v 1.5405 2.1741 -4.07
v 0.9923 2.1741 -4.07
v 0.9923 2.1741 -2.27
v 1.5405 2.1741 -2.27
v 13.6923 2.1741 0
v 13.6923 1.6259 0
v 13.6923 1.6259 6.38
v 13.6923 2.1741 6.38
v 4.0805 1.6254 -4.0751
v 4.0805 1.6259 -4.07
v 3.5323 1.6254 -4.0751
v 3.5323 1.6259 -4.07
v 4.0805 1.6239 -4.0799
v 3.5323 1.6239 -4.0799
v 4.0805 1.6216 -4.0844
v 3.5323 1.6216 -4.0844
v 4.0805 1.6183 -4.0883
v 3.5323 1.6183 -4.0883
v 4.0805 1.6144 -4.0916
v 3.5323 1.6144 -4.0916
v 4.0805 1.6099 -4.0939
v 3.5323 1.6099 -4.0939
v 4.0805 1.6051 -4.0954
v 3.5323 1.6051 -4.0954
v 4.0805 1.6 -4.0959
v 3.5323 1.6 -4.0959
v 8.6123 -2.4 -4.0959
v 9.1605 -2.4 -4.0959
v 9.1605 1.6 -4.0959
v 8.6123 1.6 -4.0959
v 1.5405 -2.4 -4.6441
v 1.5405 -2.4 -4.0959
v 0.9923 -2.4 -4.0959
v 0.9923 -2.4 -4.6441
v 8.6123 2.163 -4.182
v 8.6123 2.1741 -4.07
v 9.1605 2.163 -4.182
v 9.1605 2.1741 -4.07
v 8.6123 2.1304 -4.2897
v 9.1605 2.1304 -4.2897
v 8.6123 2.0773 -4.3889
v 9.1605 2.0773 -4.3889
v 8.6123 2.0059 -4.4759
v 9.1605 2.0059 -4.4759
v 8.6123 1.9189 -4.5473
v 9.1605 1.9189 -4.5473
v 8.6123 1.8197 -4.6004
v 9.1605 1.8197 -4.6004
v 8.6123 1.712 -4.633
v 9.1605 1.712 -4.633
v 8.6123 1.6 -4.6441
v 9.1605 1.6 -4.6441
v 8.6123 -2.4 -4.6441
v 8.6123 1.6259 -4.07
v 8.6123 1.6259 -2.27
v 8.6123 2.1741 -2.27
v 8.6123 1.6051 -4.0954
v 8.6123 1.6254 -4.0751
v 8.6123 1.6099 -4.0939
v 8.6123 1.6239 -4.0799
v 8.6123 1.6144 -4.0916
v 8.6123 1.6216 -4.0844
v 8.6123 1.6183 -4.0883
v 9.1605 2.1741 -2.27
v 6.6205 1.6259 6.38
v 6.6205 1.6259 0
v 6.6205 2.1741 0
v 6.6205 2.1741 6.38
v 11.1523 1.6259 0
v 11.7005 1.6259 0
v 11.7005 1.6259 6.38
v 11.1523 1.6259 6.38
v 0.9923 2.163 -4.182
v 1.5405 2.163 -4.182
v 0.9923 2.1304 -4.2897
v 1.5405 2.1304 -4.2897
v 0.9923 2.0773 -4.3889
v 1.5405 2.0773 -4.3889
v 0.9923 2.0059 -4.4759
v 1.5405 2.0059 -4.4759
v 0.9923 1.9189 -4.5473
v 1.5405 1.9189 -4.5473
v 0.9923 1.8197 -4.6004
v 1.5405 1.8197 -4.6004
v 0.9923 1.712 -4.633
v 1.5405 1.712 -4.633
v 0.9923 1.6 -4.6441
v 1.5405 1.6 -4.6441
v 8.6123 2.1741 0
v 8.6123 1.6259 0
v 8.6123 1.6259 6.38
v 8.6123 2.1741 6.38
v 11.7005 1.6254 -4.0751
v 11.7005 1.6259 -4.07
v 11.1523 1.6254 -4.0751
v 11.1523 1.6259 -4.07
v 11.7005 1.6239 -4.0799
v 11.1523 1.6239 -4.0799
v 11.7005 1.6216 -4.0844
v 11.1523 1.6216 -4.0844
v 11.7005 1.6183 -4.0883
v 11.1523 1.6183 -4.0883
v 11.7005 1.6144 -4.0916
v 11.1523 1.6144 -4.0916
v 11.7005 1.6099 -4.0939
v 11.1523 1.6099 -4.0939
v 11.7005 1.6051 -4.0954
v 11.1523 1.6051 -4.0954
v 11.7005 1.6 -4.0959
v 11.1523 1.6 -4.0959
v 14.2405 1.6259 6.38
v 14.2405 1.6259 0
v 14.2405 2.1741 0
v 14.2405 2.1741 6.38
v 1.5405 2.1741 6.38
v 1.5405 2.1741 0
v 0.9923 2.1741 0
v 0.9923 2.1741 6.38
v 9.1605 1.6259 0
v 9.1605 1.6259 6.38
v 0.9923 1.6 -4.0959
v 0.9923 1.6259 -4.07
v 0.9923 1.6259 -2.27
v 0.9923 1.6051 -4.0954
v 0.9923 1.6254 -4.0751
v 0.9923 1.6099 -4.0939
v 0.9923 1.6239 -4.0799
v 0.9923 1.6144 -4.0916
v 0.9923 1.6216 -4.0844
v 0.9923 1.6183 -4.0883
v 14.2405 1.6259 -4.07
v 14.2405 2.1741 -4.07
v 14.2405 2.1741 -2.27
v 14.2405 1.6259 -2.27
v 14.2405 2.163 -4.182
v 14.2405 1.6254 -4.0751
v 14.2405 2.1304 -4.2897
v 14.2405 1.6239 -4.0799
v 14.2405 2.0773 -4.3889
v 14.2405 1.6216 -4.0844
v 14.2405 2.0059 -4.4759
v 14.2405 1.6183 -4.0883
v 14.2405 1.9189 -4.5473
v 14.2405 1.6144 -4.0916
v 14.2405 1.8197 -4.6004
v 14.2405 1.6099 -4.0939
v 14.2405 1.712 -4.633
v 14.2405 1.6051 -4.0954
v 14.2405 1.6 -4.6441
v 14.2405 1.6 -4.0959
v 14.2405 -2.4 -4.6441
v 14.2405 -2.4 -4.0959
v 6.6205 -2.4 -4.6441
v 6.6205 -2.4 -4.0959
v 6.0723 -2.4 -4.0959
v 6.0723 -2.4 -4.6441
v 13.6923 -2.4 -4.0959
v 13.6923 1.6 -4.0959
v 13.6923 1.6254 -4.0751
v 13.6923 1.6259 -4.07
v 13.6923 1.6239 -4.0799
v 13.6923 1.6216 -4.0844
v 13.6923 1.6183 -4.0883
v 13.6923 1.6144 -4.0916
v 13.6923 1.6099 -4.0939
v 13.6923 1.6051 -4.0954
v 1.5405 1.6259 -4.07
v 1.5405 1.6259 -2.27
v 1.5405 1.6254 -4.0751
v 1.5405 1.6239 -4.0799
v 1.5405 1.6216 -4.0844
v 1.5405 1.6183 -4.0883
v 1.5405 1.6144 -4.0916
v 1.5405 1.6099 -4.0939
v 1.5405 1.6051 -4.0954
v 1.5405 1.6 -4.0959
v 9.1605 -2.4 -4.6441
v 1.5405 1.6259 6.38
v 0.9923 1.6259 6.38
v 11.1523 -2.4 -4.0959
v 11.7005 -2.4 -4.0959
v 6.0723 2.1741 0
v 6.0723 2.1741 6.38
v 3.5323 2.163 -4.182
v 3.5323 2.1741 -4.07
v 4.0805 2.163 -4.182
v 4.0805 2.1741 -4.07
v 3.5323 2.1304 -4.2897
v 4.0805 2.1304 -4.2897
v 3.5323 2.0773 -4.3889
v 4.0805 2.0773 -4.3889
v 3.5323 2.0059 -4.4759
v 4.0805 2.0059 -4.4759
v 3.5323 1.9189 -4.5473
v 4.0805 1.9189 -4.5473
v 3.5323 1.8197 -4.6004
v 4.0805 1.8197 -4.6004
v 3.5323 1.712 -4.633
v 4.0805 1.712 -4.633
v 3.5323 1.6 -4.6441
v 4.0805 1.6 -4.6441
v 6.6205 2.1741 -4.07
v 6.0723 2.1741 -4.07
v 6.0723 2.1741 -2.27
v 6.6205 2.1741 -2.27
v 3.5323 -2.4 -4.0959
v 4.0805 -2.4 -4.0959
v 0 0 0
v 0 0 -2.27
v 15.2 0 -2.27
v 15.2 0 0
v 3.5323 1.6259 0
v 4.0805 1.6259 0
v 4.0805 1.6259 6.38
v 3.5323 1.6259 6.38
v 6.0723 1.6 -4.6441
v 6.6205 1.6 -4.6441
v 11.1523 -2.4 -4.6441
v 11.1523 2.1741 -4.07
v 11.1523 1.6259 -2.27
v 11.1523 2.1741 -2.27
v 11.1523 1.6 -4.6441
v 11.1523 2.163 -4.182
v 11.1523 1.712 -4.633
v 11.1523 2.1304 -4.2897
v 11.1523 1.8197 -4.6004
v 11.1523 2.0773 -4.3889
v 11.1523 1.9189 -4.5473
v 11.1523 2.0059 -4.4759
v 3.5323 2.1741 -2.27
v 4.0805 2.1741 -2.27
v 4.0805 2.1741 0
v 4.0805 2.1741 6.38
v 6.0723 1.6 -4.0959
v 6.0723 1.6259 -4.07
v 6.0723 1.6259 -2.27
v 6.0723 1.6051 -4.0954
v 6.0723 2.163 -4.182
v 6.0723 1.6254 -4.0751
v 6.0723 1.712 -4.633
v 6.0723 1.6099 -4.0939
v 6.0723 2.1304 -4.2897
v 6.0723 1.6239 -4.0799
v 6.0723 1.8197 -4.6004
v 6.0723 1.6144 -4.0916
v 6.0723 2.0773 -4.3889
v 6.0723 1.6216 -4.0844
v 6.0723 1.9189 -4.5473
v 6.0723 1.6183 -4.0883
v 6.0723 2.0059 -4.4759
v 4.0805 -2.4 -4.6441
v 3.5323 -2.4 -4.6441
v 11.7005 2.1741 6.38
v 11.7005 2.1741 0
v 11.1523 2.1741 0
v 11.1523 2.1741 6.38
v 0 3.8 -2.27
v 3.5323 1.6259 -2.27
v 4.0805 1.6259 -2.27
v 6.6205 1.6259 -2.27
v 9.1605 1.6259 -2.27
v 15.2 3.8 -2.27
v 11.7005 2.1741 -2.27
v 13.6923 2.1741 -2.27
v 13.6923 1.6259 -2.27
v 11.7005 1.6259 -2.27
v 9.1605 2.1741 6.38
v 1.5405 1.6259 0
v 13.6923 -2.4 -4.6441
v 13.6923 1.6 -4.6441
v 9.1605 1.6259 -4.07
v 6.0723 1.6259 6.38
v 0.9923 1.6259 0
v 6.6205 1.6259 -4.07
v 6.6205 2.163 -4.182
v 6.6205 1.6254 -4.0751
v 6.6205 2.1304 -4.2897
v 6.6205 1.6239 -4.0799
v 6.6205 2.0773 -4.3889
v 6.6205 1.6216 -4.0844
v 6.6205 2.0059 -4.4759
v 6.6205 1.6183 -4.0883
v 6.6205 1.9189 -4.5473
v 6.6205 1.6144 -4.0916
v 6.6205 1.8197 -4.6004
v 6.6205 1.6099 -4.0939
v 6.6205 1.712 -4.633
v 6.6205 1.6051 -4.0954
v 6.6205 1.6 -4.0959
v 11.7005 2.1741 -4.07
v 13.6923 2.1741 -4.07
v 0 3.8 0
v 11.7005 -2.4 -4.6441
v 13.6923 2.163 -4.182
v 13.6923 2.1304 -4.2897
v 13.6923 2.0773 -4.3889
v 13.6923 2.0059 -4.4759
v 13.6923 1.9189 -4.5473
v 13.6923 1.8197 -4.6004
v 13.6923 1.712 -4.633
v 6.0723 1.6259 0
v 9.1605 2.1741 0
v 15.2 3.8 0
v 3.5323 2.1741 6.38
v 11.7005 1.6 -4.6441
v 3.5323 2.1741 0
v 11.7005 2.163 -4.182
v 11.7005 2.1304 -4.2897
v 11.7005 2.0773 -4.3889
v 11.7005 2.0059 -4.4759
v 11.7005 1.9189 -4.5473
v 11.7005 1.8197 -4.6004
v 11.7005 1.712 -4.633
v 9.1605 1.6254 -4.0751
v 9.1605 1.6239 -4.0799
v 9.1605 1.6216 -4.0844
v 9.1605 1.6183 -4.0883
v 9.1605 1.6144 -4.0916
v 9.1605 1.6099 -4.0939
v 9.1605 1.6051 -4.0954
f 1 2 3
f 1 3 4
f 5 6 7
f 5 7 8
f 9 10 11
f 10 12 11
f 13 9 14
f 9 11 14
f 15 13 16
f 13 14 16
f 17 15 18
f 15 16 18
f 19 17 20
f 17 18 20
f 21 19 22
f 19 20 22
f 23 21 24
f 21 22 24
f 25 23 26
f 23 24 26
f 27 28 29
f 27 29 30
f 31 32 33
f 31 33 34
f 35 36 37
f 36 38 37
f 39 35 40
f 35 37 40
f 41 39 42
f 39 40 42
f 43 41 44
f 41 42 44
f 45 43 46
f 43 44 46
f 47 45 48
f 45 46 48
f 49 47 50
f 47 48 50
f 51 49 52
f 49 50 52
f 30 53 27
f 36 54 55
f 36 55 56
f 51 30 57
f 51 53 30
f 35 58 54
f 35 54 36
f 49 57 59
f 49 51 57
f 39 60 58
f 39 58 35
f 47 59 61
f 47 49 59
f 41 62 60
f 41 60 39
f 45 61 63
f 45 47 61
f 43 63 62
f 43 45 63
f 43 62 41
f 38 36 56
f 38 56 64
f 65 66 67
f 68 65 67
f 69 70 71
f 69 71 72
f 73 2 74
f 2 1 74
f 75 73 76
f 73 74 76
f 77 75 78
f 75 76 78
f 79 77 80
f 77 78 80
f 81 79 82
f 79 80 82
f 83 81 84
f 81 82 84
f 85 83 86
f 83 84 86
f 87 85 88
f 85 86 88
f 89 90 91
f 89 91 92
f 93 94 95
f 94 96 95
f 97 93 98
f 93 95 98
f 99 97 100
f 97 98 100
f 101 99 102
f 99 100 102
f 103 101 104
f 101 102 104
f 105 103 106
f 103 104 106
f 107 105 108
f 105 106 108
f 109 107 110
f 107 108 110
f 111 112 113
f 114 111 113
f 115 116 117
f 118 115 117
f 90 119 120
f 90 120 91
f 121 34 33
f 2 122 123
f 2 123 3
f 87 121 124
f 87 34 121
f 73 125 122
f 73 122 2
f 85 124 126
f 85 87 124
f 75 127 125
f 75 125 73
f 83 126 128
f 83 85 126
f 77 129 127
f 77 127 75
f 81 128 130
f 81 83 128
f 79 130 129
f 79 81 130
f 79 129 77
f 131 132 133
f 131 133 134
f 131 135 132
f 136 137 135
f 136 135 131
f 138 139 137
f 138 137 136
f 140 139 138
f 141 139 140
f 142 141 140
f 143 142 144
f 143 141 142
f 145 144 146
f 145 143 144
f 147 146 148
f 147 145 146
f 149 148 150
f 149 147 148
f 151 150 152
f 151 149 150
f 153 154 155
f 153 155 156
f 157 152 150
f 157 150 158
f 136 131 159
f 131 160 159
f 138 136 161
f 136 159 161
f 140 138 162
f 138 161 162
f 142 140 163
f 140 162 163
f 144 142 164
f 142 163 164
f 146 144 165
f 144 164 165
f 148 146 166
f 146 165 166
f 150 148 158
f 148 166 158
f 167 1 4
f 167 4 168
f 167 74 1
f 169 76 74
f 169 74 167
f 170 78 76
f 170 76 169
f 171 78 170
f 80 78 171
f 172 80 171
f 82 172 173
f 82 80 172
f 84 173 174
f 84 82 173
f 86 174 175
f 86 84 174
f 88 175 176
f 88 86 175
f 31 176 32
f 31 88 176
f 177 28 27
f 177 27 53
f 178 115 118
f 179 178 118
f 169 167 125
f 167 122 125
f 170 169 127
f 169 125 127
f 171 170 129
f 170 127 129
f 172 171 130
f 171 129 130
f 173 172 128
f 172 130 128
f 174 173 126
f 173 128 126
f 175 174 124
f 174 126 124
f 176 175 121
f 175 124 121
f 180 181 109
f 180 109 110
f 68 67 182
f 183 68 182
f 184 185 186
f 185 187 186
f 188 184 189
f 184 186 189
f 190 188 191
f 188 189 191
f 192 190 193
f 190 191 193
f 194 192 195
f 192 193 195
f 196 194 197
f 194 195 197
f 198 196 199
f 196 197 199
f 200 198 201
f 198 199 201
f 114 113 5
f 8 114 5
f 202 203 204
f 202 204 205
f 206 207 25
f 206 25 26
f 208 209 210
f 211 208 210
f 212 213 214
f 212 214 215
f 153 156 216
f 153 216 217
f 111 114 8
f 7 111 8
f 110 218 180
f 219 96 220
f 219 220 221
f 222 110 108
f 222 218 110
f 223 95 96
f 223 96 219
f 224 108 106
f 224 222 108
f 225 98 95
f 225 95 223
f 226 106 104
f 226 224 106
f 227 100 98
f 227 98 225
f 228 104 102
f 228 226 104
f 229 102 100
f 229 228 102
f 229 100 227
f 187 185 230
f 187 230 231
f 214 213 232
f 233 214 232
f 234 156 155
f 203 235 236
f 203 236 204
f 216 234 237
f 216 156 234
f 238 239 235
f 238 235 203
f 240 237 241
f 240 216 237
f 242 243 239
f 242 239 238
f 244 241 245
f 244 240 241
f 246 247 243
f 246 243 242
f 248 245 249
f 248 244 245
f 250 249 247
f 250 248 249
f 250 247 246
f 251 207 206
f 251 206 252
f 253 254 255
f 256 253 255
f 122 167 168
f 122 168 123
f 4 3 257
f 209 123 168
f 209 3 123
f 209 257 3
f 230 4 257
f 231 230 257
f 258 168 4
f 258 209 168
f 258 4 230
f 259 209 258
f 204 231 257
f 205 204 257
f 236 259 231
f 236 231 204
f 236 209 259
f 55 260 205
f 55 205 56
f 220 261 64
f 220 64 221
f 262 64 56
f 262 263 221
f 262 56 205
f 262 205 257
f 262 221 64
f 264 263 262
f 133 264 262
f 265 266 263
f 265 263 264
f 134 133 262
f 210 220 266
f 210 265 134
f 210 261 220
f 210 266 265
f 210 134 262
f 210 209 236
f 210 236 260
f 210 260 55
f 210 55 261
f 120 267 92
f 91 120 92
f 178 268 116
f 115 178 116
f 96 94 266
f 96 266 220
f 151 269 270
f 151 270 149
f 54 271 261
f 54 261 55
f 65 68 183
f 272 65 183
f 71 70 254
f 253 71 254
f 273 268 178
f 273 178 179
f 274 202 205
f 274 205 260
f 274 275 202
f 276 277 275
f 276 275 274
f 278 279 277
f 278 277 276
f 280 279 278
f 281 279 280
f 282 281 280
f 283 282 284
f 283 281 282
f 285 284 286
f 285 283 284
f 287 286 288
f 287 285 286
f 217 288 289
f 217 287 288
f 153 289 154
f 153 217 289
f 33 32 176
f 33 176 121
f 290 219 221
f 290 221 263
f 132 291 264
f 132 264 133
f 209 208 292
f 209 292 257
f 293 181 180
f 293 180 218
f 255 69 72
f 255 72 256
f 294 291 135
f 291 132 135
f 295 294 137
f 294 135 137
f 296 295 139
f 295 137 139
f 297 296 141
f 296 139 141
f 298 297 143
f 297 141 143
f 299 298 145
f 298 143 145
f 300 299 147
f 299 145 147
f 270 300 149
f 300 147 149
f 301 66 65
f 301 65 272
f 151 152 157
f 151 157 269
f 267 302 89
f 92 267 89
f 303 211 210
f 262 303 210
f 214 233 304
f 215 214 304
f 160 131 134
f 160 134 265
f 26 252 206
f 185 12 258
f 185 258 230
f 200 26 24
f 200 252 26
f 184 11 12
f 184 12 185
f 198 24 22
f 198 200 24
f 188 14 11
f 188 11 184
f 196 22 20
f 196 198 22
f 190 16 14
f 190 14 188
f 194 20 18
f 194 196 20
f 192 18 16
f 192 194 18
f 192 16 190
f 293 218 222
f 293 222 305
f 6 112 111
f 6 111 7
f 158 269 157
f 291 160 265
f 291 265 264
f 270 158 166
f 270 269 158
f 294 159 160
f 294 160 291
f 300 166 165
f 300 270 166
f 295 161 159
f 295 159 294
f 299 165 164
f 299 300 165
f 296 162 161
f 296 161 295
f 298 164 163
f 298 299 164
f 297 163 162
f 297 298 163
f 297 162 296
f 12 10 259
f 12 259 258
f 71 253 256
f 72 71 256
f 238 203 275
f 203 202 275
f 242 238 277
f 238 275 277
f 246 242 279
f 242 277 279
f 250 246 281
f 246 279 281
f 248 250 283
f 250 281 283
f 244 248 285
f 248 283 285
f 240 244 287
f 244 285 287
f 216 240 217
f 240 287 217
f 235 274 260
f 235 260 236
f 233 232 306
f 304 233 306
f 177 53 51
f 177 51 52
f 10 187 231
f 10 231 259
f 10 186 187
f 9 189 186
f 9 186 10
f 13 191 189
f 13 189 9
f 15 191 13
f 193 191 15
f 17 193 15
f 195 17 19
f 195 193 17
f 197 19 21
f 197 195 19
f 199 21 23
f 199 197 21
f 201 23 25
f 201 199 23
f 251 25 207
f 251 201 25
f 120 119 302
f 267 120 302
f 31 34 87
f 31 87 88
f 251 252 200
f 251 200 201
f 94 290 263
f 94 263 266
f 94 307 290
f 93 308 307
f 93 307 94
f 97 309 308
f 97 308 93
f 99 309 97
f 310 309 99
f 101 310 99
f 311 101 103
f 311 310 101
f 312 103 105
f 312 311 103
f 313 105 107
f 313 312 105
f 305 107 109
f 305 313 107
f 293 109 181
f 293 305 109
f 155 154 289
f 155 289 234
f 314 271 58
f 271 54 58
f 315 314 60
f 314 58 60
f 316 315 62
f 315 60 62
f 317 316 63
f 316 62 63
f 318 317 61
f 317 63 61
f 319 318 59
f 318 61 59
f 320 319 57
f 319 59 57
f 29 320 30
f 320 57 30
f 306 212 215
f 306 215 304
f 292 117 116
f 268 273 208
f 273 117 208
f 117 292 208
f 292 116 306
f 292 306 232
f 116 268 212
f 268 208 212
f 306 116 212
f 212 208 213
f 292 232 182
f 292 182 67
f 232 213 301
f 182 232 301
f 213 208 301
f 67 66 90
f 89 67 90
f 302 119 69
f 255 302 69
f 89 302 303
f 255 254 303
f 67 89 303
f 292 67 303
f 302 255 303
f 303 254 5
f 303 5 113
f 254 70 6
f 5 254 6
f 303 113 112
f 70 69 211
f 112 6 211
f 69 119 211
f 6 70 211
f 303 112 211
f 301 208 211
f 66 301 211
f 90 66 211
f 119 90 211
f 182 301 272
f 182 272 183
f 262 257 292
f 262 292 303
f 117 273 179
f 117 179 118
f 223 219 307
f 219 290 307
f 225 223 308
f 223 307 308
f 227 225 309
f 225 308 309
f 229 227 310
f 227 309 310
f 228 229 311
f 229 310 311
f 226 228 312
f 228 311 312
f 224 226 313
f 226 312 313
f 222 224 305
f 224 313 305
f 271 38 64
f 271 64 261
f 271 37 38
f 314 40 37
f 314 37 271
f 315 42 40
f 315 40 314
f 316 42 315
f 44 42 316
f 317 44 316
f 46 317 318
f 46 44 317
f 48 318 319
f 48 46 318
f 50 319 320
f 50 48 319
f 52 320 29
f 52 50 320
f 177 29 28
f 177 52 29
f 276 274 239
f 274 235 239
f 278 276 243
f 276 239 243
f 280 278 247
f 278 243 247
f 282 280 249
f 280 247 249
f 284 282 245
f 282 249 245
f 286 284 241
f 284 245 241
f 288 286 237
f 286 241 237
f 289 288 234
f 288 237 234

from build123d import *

# Parameters (mm, degrees)
SKETCH1_W           = 15.2
SKETCH1_H           = 2.27
BOSS_EXTRUDE1_DEPTH = 3.8
SKETCH2_W           = 0.548157429
SKETCH2_H           = 0.54815743
SKETCH2_2_W         = 0.548157429
SKETCH2_2_H         = 0.54815743
BOSS_EXTRUDE2_DEPTH = 8.65


with BuildPart() as part:
    # Sketch1 → Boss-Extrude1 (new body)
    with BuildSketch(Plane(origin=(0, 0, 0), x_dir=(1, 0, 0), z_dir=(0, 1, 0))):
        with Locations((7.6, 1.135)):
            Rectangle(SKETCH1_W, SKETCH1_H)
    extrude(amount=BOSS_EXTRUDE1_DEPTH)

    # Sweep1: sweep along a path in Sketch3
    with BuildLine(Plane(origin=(0, 0, 0), x_dir=(0, 0, -1), z_dir=(1, 0, 0))) as sweep1_path:
        Line((2.27, 1.9), (4.07, 1.9))
        ThreePointArc((4.07, 1.9), (4.282132034, 1.812132034), (4.37, 1.6))
        Line((4.37, 1.6), (4.37, -2.4))
    # Sketch2 → Sweep1 (sweep)
    with BuildSketch(Plane(origin=(0, 0, -2.27), x_dir=(-1, 0, 0), z_dir=(0, 0, -1))):
        with Locations((-1.266407872, 1.9)):
            Rectangle(SKETCH2_W, SKETCH2_H)
        with Locations((-3.806407872, 1.9)):
            Rectangle(SKETCH2_W, SKETCH2_H)
        with Locations((-6.346407872, 1.9)):
            Rectangle(SKETCH2_W, SKETCH2_H)
        with Locations((-8.886407872, 1.9)):
            Rectangle(SKETCH2_W, SKETCH2_H)
        with Locations((-11.426407872, 1.9)):
            Rectangle(SKETCH2_W, SKETCH2_H)
        with Locations((-13.966407872, 1.9)):
            Rectangle(SKETCH2_W, SKETCH2_H)
    sweep(path=sweep1_path.line)

    # Sketch2_2 → Boss-Extrude2 (add)
    with BuildSketch(Plane(origin=(0, 0, -2.27), x_dir=(-1, 0, 0), z_dir=(0, 0, -1))):
        with Locations((-1.266407872, 1.9)):
            Rectangle(SKETCH2_2_W, SKETCH2_2_H)
        with Locations((-3.806407872, 1.9)):
            Rectangle(SKETCH2_2_W, SKETCH2_2_H)
        with Locations((-6.346407872, 1.9)):
            Rectangle(SKETCH2_2_W, SKETCH2_2_H)
        with Locations((-8.886407872, 1.9)):
            Rectangle(SKETCH2_2_W, SKETCH2_2_H)
        with Locations((-11.426407872, 1.9)):
            Rectangle(SKETCH2_2_W, SKETCH2_2_H)
        with Locations((-13.966407872, 1.9)):
            Rectangle(SKETCH2_2_W, SKETCH2_2_H)
    extrude(amount=-BOSS_EXTRUDE2_DEPTH)


solid = part.part
